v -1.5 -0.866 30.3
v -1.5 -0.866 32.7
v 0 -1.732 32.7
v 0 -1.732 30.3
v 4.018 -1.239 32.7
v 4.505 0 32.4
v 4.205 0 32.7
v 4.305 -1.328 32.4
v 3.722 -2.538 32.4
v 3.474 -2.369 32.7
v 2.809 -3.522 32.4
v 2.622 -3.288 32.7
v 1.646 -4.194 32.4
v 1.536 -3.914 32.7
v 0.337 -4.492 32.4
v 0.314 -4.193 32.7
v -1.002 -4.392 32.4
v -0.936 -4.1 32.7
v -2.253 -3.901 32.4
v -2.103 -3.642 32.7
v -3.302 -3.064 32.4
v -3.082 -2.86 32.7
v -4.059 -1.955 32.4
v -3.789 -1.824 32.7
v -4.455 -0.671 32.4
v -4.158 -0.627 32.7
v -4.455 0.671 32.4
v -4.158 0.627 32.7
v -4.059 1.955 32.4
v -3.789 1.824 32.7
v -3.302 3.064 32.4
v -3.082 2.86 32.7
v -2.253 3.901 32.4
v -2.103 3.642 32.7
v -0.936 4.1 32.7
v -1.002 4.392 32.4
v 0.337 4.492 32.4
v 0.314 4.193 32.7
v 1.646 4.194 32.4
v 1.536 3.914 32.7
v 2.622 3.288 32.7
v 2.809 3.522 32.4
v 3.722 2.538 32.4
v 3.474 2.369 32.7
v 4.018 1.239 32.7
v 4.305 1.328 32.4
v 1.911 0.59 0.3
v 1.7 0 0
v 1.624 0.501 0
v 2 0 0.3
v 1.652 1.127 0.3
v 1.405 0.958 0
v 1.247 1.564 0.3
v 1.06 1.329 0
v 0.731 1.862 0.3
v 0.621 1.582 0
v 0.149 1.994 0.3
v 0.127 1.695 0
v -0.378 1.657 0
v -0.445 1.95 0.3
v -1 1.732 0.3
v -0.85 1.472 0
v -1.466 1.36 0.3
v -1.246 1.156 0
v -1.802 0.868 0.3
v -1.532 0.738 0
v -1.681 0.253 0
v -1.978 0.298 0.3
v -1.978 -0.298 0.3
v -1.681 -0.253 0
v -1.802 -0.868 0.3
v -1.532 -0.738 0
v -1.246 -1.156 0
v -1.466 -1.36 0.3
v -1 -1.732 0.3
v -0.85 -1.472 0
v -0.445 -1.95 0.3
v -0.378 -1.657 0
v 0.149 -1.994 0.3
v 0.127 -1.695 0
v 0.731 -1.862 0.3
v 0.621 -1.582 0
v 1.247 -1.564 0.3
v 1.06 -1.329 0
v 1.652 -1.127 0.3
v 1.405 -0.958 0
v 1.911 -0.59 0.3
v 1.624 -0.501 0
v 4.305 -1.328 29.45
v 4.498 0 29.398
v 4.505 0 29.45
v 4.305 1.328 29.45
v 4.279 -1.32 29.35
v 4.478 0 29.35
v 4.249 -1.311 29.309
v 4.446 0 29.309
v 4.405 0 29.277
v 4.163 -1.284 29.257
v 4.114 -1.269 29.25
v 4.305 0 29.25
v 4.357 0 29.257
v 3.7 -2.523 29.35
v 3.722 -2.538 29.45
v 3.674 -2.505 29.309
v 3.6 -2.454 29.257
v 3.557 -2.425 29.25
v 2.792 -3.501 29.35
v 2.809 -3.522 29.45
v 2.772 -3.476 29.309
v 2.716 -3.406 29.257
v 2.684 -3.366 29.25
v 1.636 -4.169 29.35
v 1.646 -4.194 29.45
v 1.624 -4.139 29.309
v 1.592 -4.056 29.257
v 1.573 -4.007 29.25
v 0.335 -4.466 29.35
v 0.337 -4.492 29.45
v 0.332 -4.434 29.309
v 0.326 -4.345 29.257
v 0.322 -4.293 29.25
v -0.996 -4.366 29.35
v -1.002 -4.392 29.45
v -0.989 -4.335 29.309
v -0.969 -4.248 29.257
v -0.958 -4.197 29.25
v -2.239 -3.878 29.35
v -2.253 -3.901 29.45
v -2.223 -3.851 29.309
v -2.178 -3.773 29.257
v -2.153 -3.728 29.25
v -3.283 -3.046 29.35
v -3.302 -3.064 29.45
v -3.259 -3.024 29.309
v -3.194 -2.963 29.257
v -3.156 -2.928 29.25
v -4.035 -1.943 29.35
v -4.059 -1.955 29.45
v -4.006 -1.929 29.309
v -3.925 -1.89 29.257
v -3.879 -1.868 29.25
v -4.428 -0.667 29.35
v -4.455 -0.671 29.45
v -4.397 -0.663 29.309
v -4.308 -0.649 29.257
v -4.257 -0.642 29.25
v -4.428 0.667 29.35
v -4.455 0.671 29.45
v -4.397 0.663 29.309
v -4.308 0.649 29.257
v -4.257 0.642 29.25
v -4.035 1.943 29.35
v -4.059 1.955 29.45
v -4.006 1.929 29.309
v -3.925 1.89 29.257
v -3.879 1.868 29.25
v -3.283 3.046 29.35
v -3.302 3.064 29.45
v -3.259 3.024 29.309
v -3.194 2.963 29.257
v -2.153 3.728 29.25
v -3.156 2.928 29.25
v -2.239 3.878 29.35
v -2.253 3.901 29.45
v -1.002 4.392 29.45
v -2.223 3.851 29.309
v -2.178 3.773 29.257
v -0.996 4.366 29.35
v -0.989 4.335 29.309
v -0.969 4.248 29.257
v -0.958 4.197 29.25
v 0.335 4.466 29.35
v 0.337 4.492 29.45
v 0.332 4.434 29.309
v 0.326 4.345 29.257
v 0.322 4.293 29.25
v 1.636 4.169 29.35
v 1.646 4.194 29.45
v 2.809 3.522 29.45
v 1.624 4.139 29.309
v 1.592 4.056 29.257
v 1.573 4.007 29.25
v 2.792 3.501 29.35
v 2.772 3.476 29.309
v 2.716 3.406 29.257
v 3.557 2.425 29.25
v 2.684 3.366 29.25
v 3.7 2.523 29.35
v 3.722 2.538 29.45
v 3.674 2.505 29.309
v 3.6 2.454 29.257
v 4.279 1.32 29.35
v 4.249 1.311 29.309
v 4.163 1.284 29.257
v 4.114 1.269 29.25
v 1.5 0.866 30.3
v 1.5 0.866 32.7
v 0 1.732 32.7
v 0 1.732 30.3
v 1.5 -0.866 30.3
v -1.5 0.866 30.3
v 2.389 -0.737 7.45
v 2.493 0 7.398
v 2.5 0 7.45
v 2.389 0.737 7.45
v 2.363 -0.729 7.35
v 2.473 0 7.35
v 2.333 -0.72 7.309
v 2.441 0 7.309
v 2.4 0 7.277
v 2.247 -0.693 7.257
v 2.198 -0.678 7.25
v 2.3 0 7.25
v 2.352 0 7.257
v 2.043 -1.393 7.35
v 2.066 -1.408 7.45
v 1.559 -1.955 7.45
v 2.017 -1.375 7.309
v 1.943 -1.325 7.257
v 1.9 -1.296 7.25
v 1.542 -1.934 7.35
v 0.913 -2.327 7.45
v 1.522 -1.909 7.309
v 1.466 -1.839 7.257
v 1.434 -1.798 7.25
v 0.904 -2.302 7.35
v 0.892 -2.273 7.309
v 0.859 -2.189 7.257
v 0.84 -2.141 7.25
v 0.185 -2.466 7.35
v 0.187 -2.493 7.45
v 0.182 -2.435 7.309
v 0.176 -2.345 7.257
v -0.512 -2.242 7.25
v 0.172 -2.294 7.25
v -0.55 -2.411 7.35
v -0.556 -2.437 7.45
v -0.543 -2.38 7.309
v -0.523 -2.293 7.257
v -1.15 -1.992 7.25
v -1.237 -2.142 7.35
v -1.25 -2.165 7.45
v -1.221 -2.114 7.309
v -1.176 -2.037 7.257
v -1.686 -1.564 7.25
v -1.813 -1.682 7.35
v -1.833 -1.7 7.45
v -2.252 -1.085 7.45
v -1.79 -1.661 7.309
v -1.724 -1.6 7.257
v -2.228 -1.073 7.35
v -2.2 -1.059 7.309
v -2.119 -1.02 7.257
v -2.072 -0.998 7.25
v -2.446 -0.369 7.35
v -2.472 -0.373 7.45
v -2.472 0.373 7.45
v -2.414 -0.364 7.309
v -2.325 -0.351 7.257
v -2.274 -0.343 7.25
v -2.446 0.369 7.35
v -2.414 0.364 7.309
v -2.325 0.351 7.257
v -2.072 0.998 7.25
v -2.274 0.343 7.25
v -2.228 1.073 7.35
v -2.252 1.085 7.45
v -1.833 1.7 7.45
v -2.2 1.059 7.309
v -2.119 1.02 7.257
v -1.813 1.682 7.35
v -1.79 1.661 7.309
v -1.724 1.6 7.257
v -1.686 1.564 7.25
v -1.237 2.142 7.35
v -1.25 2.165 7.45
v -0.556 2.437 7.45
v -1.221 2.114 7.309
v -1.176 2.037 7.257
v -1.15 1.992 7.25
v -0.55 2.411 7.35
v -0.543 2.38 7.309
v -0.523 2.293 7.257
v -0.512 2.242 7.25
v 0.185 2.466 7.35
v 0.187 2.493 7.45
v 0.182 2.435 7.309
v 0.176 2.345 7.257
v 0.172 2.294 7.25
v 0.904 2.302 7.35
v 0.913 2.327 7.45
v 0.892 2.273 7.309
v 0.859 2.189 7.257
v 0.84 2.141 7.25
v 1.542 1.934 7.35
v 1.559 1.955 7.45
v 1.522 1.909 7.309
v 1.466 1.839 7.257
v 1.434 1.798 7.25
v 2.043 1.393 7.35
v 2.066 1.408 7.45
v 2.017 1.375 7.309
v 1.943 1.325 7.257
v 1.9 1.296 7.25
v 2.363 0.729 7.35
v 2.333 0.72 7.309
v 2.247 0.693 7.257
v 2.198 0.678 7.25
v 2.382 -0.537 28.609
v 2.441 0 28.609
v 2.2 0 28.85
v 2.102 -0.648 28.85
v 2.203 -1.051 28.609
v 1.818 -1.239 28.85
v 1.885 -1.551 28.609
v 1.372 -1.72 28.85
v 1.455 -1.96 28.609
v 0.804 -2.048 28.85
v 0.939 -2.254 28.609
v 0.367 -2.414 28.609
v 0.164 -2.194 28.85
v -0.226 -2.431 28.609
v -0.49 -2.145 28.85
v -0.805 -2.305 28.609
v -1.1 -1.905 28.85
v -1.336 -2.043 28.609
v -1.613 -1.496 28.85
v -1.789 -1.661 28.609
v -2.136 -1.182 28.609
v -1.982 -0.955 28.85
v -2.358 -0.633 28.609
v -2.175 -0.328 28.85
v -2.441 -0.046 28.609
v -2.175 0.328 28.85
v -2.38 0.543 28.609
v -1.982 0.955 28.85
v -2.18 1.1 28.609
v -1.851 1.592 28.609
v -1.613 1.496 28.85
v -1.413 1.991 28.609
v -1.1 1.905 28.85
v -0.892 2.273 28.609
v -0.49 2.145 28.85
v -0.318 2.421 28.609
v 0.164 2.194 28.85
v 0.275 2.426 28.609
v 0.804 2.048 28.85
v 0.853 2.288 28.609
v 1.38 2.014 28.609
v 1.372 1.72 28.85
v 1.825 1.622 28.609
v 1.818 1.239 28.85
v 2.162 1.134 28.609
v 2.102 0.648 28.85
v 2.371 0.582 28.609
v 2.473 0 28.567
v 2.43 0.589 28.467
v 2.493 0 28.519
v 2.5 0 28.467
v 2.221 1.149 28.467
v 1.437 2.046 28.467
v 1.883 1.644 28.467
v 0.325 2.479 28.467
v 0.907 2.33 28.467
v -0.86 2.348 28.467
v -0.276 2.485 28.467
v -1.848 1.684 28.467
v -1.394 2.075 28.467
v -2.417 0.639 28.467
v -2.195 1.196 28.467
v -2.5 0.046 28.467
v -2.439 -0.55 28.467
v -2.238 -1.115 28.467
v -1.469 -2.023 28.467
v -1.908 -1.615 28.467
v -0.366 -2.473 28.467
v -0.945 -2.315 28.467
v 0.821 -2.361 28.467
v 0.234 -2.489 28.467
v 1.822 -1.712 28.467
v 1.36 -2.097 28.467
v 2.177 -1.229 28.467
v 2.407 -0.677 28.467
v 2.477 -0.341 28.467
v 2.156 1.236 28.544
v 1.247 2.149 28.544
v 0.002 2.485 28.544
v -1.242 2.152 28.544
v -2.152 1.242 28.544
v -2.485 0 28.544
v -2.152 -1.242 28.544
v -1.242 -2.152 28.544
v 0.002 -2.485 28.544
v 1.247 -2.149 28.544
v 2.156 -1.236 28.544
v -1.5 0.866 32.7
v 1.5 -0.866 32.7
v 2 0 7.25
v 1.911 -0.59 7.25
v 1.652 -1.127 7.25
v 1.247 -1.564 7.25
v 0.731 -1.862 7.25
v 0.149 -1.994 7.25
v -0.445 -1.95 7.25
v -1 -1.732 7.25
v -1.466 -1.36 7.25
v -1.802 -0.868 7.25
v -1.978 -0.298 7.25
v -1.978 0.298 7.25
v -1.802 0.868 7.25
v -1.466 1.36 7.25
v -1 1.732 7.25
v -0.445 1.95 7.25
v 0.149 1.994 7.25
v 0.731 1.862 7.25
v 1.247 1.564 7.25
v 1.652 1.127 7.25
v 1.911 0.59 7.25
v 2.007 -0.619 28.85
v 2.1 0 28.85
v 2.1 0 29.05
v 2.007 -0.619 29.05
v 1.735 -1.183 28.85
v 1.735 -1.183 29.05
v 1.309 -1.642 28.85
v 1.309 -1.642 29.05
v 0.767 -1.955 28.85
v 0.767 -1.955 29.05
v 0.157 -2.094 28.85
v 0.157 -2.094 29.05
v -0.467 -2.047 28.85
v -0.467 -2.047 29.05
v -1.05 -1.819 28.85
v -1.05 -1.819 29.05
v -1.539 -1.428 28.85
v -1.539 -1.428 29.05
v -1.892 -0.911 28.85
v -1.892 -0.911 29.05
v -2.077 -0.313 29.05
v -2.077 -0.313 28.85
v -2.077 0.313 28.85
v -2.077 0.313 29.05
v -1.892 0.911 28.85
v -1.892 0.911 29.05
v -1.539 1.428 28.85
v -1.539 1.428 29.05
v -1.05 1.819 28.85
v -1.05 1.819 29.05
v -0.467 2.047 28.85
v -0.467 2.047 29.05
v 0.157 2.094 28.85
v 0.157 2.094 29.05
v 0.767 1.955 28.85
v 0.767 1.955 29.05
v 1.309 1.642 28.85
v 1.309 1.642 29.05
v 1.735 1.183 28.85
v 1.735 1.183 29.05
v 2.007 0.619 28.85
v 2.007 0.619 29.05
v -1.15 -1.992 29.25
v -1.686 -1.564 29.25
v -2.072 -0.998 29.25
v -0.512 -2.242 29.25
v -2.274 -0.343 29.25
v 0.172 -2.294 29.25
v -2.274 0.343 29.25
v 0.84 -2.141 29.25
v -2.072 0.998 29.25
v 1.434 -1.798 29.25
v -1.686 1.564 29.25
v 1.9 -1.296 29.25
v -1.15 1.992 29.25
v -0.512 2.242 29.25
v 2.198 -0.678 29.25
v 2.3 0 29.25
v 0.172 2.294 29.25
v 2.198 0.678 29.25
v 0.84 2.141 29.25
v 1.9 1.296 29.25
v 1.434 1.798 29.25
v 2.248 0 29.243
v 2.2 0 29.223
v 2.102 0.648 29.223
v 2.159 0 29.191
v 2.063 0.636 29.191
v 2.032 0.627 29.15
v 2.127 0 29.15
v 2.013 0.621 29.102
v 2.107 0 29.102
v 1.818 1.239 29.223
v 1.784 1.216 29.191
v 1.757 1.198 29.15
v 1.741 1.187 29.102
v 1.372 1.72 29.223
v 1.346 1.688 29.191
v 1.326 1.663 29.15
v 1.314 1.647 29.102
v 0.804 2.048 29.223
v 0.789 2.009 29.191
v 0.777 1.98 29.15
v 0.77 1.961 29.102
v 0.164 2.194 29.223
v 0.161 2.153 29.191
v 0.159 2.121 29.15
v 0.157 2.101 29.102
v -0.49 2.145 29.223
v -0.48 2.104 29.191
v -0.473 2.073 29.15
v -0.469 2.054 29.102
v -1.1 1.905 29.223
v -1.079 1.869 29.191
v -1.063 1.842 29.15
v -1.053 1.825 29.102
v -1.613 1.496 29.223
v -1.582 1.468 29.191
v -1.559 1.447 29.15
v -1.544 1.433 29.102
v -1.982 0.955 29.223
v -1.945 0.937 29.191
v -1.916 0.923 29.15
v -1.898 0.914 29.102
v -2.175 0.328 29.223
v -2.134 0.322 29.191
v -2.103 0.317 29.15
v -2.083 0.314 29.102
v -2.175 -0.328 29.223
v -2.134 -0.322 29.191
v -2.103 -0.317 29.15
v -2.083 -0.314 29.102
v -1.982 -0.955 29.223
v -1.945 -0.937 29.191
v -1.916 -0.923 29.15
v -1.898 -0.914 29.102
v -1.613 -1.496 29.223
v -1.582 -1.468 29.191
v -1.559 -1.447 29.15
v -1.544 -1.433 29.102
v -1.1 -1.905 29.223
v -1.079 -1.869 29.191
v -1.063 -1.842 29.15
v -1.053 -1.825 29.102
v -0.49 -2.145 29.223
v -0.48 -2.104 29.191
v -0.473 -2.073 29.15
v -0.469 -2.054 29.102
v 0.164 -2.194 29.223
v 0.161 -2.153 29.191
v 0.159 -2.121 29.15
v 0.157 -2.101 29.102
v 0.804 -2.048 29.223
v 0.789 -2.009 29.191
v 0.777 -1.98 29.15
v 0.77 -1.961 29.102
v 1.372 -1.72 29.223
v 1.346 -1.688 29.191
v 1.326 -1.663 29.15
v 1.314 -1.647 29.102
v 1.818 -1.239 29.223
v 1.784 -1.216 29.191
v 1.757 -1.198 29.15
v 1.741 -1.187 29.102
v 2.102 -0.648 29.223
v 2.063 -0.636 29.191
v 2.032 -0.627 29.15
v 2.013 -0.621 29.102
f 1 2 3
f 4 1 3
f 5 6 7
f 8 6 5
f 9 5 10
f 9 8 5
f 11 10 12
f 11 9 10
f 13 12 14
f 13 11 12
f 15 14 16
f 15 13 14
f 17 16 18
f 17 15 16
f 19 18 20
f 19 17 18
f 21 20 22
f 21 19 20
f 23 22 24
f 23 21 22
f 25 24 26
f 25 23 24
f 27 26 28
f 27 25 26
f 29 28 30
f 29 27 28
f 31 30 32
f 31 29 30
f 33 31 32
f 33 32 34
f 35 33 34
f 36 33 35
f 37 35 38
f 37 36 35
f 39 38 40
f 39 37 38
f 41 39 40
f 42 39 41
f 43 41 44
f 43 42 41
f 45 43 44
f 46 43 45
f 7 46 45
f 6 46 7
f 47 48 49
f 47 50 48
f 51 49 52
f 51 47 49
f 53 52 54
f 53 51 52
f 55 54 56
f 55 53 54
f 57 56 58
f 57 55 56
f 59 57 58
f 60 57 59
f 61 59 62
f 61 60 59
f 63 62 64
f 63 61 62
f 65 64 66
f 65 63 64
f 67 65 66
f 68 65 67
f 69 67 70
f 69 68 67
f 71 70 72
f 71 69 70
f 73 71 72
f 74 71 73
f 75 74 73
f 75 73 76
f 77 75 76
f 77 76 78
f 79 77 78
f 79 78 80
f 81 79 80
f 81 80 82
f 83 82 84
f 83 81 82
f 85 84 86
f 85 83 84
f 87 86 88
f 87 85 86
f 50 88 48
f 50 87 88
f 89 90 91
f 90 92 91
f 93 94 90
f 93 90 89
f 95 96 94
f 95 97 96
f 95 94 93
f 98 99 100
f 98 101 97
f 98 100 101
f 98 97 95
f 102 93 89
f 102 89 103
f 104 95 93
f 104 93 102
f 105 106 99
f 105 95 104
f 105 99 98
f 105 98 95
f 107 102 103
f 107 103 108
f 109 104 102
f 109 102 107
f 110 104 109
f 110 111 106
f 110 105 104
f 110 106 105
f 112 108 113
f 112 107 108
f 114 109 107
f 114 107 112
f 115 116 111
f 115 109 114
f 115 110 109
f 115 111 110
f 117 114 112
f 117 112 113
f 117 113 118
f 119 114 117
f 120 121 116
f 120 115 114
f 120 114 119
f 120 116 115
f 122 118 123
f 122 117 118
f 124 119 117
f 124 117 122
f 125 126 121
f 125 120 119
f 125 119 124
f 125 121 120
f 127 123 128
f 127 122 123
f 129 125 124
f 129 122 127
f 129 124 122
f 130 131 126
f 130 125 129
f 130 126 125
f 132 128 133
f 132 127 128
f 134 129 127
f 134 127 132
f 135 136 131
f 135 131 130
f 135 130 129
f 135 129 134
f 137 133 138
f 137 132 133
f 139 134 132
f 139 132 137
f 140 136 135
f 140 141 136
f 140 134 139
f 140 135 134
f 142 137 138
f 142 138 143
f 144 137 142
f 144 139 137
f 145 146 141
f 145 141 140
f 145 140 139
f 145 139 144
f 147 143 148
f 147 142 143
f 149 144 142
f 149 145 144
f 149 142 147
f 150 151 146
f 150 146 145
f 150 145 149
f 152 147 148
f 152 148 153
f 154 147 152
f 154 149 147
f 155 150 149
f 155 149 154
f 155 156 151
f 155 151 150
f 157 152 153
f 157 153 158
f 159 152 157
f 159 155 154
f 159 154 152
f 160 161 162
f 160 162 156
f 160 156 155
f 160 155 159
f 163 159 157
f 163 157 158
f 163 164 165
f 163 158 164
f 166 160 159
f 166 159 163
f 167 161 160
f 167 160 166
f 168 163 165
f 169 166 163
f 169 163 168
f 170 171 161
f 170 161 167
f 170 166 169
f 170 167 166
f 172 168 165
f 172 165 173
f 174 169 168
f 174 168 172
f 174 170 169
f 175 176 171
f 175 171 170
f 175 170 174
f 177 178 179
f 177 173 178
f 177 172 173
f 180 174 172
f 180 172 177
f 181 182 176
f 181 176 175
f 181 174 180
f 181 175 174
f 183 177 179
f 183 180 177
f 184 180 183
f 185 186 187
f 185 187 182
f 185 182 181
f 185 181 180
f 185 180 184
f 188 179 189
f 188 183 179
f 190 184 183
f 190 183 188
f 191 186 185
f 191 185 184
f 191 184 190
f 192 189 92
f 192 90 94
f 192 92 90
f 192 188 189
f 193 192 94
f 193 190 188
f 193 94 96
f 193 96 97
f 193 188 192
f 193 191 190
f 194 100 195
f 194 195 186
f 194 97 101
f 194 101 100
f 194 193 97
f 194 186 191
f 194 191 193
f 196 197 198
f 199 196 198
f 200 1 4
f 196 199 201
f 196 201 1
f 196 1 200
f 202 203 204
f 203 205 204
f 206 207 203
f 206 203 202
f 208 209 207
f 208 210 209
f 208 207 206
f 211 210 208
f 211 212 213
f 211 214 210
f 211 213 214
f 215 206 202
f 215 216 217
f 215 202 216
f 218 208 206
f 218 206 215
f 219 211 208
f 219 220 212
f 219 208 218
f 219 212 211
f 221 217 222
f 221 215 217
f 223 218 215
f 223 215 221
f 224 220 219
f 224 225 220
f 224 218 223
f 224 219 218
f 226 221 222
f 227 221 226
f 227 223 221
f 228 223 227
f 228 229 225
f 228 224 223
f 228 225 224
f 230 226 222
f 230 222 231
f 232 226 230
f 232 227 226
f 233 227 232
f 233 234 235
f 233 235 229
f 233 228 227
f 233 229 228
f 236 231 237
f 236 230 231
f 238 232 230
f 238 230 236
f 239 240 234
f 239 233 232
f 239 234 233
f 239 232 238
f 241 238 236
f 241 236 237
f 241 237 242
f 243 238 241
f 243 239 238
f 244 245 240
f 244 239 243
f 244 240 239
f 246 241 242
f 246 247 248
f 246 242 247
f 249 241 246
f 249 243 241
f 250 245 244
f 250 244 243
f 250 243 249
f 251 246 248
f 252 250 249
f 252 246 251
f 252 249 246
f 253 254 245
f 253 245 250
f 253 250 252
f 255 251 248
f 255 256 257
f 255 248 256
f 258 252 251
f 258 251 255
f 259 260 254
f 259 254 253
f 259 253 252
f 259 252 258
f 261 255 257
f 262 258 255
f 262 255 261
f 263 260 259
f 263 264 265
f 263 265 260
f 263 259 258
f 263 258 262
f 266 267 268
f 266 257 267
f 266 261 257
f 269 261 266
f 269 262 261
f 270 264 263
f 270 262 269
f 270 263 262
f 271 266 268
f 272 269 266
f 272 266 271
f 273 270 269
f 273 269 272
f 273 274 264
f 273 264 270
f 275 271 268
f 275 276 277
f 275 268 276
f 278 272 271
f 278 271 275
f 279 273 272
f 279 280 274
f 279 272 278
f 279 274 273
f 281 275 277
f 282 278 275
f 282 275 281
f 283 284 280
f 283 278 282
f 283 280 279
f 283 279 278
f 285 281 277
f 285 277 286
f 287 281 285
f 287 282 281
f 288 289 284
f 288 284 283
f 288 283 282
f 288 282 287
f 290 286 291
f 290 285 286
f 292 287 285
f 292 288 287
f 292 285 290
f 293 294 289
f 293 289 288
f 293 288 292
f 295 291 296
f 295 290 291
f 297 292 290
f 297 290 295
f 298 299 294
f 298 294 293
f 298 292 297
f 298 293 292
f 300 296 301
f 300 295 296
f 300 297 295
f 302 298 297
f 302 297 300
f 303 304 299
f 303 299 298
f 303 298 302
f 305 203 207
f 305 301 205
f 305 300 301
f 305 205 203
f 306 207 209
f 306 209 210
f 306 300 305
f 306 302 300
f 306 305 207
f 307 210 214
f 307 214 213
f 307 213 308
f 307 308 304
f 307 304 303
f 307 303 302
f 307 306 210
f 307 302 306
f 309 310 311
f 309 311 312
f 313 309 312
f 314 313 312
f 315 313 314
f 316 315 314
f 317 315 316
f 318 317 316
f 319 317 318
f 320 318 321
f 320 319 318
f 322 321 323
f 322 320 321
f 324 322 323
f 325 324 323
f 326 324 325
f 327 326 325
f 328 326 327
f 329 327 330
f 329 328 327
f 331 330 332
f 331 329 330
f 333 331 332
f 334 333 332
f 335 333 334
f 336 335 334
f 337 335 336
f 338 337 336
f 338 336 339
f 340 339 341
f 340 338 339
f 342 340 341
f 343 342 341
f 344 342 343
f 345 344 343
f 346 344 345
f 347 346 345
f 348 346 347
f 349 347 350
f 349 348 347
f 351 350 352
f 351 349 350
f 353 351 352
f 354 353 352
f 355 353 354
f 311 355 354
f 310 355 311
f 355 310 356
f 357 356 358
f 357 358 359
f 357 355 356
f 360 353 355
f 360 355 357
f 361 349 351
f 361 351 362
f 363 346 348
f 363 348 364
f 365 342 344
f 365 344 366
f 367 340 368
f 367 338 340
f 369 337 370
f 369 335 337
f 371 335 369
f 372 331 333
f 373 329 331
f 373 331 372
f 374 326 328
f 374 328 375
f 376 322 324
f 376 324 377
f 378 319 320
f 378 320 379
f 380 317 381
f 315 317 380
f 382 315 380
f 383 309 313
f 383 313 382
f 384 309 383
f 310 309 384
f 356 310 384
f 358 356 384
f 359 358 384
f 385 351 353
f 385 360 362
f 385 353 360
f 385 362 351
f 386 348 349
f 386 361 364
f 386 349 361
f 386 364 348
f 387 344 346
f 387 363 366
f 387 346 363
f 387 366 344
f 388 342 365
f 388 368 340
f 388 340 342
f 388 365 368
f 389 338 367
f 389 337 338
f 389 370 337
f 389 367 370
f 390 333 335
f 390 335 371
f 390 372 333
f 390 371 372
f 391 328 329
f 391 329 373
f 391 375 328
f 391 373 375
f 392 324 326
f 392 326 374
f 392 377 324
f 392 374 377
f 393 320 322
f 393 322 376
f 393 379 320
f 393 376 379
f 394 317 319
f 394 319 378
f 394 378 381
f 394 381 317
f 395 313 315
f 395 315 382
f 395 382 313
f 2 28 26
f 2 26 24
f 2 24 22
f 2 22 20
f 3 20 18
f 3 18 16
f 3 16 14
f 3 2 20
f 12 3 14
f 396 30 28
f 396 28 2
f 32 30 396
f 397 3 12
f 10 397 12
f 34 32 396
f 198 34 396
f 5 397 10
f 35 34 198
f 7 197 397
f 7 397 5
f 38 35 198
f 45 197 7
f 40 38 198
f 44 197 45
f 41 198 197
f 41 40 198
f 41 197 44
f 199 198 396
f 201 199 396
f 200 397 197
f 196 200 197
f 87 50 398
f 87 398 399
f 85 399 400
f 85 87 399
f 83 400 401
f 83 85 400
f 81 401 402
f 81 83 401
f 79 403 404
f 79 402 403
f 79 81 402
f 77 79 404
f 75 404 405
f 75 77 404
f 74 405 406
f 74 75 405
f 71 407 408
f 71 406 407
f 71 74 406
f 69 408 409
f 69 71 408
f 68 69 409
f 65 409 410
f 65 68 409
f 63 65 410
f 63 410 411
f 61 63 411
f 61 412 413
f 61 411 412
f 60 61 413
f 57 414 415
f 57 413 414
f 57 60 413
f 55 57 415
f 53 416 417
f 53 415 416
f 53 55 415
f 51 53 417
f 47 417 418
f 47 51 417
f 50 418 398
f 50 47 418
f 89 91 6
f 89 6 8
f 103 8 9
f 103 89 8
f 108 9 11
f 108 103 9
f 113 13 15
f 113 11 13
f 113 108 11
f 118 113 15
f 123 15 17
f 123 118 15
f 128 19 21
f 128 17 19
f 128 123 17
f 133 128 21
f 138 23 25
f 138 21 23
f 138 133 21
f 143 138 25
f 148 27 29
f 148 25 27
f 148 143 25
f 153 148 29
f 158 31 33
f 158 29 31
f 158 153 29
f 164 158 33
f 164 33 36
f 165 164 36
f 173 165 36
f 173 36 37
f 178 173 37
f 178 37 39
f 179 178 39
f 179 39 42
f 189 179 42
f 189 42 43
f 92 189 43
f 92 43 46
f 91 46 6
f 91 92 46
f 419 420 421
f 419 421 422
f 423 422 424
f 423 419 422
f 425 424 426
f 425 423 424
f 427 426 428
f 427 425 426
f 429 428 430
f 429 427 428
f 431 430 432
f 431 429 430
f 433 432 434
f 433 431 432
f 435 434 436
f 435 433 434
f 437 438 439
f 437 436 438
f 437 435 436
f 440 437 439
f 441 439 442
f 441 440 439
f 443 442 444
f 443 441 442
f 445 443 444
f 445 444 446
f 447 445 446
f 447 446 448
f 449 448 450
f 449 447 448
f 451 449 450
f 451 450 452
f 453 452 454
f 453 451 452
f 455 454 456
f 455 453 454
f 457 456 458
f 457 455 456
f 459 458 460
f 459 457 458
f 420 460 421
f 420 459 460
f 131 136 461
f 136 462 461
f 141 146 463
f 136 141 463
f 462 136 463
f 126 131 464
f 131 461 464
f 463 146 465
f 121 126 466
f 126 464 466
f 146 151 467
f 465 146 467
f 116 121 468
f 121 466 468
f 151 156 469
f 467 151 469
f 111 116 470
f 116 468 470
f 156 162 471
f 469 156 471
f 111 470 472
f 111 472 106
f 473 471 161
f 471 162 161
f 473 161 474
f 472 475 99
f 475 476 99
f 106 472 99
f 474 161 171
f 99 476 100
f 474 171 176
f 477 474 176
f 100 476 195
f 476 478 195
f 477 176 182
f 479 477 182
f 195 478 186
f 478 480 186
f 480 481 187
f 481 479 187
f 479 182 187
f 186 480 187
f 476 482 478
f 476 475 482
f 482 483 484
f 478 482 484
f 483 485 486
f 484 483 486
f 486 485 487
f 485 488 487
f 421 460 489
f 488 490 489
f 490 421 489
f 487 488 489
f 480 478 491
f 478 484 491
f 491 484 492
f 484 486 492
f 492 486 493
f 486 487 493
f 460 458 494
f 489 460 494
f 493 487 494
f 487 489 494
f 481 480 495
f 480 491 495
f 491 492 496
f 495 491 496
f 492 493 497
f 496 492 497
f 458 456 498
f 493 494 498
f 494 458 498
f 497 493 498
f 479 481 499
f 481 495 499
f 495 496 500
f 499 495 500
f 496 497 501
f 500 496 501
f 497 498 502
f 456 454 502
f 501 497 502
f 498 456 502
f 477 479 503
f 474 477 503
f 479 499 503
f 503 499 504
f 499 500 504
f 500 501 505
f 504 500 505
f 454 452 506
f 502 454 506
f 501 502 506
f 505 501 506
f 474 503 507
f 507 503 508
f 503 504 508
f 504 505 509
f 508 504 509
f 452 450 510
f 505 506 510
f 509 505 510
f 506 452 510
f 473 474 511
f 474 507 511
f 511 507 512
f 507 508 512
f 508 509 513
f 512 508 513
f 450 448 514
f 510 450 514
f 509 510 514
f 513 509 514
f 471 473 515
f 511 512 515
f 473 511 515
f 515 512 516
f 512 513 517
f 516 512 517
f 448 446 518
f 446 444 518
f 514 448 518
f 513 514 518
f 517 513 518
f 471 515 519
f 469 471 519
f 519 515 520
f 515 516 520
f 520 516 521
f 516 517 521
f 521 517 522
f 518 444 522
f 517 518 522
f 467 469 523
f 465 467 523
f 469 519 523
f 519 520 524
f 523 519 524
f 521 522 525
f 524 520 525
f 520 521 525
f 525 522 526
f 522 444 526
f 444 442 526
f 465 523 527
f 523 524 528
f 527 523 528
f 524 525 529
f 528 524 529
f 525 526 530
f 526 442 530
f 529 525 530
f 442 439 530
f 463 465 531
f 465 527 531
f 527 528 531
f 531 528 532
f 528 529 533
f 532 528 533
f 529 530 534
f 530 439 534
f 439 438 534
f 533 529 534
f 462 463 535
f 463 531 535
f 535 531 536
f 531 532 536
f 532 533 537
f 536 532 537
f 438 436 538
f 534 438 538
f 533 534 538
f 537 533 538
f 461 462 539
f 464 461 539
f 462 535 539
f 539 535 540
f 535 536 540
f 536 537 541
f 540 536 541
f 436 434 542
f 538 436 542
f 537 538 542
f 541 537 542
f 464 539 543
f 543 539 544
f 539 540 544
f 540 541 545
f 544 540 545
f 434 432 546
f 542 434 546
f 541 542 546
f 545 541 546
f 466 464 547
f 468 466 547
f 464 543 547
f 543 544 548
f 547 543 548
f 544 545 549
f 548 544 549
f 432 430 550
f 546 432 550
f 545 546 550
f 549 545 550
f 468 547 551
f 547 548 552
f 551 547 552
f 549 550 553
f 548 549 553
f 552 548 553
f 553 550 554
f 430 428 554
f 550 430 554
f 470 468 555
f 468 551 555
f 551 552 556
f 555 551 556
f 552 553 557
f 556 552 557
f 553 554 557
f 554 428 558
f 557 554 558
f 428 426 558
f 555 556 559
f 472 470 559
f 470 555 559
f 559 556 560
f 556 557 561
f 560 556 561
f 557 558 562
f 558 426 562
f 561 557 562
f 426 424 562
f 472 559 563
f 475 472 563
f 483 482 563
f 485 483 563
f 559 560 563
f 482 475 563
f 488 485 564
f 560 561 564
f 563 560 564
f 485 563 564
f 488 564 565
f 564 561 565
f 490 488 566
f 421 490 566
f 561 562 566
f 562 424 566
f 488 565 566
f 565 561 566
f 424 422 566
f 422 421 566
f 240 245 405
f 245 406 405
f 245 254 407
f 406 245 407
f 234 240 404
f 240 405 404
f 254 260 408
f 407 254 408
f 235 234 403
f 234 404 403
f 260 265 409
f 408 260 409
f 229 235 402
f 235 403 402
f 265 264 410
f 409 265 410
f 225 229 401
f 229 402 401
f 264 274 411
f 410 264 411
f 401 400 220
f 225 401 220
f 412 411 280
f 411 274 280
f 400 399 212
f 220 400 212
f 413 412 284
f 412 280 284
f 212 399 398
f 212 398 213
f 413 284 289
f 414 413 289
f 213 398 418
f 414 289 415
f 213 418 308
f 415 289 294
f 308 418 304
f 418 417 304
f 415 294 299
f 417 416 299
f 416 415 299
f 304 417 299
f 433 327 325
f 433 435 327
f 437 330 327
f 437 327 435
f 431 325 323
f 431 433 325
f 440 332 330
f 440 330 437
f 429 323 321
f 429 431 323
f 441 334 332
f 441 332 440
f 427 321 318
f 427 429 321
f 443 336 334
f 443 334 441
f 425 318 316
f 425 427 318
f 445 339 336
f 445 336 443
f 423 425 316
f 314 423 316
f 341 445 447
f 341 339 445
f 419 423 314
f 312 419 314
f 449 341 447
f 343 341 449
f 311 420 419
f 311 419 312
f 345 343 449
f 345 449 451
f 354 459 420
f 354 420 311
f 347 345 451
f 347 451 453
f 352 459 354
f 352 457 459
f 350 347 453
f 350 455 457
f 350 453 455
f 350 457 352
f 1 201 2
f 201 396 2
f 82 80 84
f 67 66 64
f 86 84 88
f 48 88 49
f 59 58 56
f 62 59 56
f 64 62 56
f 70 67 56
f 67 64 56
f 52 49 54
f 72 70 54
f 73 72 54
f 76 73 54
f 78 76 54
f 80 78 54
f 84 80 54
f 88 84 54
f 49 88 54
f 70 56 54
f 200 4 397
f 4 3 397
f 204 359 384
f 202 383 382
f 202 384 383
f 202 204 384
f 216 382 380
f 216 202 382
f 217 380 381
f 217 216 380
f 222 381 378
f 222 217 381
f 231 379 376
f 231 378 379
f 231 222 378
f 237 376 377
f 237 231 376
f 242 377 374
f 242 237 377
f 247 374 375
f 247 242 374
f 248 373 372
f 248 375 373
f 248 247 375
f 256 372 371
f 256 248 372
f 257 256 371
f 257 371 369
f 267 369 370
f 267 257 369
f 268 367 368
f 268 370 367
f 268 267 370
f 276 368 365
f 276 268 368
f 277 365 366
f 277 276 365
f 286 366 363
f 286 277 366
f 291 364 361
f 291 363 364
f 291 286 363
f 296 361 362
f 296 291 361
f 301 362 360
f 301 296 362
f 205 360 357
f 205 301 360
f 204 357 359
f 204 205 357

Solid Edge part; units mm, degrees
sketch "Sketch1" plane through (0, 0, 0) normal (0, -1, 0) x (1, 0, 0)
  line L0 (0, 32.7) -> (4.505, 32.7)
  line L1 (4.505, 32.7) -> (4.505, 29.25)
  line L2 (4.505, 29.25) -> (2.1, 29.25)
  line L3 (2.1, 29.25) -> (2.1, 28.85)
  line L4 (2.1, 28.85) -> (2.5, 28.85)
  line L5 (2.5, 28.85) -> (2.5, 7.25)
  line L6 (2.5, 7.25) -> (2, 7.25)
  line L7 (2, 7.25) -> (2, 0)
  line L8 (2, 0) -> (0, 0)
  dimension "D1" = 4.505
  dimension "D2" = 3.45
  dimension "D3" = 22
  dimension "D4" = 0.4
  dimension "D5" = 7.25
  dimension "D6" = 2.5
  dimension "D7" = 2
revolve "RevolvedProtrusion1" add sketch "Sketch1" angle 360 about axis through (0, 0, 0) along (0, 0, 1)
chamfer "Chamfer1" distance 0.3 angle 45 3 edges at (-2.5, 0, 28.85) (-4.505, 0, 32.7) (-2, 0, 0)
fillet "Round_1" radius 0.2 4 edges at (-4.505, 0, 29.25) (-2.1, 0, 29.25) (-2.5, 0, 7.25) (-2.5, 0, 28.55)
sketch "Sketch2" plane through (0, 0, 32.7) normal (0, 0, 1) x (1, 0, 0)
  line L0 (1.5, 0.866) -> (0, 1.7321)
  line L1 (0, 1.7321) -> (-1.5, 0.866)
  line L2 (-1.5, 0.866) -> (-1.5, -0.866)
  line L3 (-1.5, -0.866) -> (0, -1.7321)
  line L4 (0, -1.7321) -> (1.5, -0.866)
  line L5 (1.5, -0.866) -> (1.5, 0.866)
  dimension "D1" = 3
extrude "ExtrudedCutout_1" cut sketch "Sketch2" against normal blind 2.4
properties material "Stainless Steel, 304"
